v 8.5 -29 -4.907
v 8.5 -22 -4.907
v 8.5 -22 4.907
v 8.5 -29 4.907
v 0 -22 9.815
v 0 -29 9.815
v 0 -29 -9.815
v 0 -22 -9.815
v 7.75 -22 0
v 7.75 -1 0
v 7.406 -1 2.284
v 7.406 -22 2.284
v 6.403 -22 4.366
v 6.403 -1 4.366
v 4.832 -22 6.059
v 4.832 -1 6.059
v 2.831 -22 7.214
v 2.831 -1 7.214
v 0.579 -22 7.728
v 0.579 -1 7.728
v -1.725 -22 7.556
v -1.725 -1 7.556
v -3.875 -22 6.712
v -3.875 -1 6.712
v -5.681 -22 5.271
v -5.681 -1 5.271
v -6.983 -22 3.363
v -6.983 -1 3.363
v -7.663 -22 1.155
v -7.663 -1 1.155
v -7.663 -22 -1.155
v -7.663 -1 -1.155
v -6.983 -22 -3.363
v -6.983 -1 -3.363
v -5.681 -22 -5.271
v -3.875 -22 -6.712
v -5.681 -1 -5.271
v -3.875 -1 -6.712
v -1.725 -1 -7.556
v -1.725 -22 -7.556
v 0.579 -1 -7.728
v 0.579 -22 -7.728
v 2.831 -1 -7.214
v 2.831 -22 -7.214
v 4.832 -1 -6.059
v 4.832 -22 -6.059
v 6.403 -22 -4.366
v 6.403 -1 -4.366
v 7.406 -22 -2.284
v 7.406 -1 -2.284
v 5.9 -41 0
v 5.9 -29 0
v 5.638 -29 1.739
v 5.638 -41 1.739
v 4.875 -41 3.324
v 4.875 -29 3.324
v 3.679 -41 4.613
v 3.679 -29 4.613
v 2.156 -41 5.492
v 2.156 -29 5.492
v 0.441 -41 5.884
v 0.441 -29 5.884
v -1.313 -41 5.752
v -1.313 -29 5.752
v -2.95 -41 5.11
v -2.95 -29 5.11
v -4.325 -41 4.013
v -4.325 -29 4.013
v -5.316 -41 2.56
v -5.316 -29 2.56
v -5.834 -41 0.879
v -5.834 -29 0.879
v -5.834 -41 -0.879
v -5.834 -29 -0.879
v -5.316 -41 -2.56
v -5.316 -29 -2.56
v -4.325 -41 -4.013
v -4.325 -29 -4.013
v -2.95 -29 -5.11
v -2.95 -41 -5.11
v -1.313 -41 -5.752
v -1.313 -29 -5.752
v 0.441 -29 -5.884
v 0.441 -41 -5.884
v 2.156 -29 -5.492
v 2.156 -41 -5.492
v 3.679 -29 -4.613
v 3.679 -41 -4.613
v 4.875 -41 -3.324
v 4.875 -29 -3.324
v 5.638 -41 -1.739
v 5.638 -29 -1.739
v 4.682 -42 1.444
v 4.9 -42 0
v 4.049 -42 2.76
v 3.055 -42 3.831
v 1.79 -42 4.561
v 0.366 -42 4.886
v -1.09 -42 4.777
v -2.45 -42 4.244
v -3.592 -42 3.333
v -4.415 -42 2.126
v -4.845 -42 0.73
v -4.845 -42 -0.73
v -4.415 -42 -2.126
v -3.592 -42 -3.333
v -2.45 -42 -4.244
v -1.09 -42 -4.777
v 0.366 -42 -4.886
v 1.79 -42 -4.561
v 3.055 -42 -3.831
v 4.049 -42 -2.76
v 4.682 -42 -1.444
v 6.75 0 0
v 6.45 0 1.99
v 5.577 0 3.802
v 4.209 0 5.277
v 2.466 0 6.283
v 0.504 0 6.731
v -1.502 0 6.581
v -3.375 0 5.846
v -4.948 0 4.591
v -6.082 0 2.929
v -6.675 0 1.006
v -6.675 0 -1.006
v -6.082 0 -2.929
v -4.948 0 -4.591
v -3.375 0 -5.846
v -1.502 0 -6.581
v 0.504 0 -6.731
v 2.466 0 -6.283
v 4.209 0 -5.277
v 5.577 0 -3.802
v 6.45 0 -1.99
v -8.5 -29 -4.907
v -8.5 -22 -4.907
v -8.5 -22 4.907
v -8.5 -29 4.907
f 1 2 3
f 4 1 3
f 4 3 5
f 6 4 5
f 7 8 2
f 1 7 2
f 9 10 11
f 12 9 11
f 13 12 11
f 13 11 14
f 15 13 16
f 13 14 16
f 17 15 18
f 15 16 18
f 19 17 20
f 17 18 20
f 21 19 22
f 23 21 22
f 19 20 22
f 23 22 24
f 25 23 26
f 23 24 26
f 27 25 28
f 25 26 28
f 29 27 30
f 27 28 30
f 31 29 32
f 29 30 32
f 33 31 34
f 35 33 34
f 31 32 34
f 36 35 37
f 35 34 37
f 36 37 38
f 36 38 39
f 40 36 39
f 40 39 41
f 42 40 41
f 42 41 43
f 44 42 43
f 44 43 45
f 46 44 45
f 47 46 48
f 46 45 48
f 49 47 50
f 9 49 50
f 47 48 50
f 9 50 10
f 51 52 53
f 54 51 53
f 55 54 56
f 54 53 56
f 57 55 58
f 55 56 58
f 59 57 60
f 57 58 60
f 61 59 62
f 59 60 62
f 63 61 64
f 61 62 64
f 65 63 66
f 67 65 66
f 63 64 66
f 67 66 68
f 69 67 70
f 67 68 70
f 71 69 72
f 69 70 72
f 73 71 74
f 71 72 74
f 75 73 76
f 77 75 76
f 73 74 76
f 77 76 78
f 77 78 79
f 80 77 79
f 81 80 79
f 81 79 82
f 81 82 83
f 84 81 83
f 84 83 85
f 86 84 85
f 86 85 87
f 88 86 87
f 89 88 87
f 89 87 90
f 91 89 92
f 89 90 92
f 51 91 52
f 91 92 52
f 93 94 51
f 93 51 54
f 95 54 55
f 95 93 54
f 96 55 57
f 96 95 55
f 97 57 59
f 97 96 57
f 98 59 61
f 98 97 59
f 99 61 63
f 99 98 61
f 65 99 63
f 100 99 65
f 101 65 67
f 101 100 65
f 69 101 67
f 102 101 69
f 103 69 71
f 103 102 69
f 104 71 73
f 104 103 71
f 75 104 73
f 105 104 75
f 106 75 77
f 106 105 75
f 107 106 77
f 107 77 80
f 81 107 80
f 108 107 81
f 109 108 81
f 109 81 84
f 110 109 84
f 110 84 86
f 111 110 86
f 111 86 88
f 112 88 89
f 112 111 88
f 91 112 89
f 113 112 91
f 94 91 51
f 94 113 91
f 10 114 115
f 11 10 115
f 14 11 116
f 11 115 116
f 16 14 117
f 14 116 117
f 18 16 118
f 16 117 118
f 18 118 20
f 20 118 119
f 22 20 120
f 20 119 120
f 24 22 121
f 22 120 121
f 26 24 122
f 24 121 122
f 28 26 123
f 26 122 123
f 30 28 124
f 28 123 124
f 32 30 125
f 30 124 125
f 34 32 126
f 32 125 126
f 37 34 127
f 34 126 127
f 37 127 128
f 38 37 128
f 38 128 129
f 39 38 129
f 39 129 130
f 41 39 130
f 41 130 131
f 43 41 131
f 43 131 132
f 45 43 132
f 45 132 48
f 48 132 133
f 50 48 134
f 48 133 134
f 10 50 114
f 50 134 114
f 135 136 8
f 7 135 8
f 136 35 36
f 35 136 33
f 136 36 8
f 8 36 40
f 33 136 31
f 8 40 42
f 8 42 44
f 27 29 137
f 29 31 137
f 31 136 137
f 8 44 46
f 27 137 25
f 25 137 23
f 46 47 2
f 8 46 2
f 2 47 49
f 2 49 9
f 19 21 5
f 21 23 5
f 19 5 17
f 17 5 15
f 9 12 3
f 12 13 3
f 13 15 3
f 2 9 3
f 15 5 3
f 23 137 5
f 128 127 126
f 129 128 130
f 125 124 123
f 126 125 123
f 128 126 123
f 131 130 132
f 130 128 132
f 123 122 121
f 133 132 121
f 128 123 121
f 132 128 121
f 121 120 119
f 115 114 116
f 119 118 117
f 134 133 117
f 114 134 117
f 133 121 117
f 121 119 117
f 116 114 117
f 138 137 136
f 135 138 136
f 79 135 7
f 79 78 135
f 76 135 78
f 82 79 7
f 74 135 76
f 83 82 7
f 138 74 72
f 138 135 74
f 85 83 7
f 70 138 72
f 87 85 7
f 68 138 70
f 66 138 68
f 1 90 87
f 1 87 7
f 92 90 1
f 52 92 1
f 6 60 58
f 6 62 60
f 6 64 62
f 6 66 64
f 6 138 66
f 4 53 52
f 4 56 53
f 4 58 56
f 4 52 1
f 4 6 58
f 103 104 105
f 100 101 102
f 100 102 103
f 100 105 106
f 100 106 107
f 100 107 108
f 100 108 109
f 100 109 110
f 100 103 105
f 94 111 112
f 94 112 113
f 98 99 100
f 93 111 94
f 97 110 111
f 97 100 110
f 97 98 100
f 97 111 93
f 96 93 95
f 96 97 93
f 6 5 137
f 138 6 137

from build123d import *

# Parameters (mm, degrees)
F0_R     = 7.75
F1_DEPTH = 22
F3_DEPTH = 7
F4_R     = 5.9
F5_DEPTH = 13
F6_SIZE  = 1


with BuildPart() as f1:
    # F0 (on Front) → F1 (new body)
    with BuildSketch(Plane.XZ):
        Circle(F0_R)
    extrude(amount=F1_DEPTH)

    # F2 (on face) → F3 (join)
    with BuildSketch(Plane.XZ.offset(22)):
        Polygon((8.5, -4.907477), (8.5, 4.907477), (0, 9.814955), (-8.5, 4.907477), (-8.5, -4.907477), (0, -9.814955), align=None)
    extrude(amount=F3_DEPTH)

    # F4 (on face) → F5 (join)
    with BuildSketch(Plane.XZ.offset(29)):
        Circle(F4_R)
    extrude(amount=F5_DEPTH)

    # F6
    f6_edges = [f1.edges().sort_by_distance(p)[0] for p in [
        (-5.9, -42, 0),
        (-7.75, 0, 0),
    ]]
    chamfer(f6_edges, length=F6_SIZE)


solid = f1.part
